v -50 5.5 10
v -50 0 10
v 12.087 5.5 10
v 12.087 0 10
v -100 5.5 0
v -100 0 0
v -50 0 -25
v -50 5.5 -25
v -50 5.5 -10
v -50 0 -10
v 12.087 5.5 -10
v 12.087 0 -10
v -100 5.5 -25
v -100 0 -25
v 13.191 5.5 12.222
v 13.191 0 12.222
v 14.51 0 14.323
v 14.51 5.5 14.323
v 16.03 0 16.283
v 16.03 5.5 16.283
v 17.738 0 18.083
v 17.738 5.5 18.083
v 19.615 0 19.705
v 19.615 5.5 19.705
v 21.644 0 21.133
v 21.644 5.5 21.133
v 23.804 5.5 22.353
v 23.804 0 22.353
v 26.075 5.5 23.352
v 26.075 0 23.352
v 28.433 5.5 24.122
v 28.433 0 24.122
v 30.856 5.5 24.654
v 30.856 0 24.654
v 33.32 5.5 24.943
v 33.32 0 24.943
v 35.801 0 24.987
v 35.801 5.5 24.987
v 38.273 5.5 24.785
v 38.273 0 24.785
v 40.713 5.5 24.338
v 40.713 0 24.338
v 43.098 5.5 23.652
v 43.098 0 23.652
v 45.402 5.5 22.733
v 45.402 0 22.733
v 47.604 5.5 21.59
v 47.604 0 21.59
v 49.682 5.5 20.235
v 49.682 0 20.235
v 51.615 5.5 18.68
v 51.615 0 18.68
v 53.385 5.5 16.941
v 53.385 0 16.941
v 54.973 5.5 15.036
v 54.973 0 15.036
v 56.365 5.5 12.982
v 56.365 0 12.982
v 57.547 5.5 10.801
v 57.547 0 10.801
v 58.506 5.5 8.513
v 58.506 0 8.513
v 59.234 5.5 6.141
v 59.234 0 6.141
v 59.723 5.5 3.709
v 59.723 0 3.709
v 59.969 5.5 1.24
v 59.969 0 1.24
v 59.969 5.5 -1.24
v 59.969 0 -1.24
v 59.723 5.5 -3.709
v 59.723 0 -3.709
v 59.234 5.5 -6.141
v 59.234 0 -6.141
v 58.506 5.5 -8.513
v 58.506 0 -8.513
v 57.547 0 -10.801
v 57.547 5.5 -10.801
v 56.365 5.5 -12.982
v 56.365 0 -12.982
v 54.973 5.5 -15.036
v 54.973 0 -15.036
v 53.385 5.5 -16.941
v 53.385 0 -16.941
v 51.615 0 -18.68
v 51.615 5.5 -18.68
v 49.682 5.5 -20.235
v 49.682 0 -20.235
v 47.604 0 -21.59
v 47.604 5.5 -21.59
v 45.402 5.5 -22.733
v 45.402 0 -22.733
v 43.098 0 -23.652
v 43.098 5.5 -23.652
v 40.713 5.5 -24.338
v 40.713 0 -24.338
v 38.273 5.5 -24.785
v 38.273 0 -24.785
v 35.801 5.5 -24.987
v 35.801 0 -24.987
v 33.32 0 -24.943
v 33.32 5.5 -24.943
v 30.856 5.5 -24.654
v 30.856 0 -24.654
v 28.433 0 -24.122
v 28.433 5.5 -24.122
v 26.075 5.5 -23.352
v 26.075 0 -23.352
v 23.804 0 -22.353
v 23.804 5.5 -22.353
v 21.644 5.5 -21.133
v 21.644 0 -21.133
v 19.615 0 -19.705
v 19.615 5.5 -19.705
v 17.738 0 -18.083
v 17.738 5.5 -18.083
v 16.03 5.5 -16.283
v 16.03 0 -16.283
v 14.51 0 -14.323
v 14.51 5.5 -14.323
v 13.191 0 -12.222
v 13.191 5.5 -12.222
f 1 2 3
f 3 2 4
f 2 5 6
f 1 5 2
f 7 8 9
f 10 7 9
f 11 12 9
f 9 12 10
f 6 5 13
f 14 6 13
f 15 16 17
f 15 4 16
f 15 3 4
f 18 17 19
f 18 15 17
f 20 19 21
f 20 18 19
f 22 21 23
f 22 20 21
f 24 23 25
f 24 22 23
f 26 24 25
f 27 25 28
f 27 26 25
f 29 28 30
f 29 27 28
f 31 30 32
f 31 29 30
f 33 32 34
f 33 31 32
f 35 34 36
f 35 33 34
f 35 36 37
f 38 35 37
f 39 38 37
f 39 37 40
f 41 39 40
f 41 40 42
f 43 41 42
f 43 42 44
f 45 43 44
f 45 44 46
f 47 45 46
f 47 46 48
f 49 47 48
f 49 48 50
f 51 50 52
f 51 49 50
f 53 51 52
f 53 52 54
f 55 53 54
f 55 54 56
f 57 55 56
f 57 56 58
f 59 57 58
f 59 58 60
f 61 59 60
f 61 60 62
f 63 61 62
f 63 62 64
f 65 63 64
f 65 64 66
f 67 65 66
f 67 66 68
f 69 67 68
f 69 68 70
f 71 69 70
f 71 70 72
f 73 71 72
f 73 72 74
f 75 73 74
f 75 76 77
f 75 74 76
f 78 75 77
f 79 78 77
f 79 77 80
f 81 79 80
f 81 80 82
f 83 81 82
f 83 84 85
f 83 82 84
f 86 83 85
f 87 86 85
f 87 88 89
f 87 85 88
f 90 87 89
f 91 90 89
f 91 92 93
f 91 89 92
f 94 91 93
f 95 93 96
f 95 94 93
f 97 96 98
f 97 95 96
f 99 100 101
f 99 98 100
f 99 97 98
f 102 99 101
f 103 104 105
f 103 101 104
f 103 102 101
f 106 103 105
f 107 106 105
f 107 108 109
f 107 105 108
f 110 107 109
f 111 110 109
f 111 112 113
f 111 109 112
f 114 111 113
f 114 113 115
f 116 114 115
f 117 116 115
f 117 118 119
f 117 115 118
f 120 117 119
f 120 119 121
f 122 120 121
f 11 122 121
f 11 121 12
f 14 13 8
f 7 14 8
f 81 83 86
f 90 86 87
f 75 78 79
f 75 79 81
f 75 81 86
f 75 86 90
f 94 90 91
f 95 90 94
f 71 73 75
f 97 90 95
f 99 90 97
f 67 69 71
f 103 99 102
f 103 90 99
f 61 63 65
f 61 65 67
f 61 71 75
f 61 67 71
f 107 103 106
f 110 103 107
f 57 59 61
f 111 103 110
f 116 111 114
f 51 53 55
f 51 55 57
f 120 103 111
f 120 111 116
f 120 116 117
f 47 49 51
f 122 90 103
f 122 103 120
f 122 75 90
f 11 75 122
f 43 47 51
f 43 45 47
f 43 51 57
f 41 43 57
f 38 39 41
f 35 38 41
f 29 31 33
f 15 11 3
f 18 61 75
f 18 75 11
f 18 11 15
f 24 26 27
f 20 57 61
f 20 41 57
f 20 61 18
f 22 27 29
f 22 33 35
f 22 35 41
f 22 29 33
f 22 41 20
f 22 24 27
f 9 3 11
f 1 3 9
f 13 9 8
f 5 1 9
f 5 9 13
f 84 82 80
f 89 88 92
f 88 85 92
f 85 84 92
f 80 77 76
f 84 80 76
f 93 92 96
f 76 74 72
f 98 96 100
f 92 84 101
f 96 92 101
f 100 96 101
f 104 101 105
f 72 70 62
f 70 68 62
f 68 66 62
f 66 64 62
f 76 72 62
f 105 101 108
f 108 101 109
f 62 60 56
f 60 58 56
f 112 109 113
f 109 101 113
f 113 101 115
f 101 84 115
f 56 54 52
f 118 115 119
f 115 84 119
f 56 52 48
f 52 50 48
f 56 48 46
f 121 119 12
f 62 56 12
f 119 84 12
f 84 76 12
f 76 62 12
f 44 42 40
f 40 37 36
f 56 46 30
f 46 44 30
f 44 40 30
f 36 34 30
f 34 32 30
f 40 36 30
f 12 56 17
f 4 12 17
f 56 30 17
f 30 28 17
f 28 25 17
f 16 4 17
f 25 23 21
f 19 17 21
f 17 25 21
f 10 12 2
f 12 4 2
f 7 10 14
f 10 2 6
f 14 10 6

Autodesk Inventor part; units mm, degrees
ref_plane "YZ Plane" through (0, 0, 0) normal (1, 0, 0) x (0, 1, 0)
ref_plane "XZ Plane" through (0, 0, 0) normal (0, 1, 0) x (-1, 0, 0)
ref_plane "XY Plane" through (0, 0, 0) normal (0, 0, 1) x (1, 0, 0)
sketch "Boceto1" plane through (0, 0, 0) normal (0, 1, 0) x (-1, 0, 0)
  line L0 (50, 10) -> (-50, 10)
  line L1 (-50, 10) -> (-50, -10)
  line L2 (-50, -10) -> (50, -10)
  line L3 (50, -10) -> (50, 10)
  line L4 (50, 10) -> (-50, -10) construction
  line L5 (-50, 10) -> (50, -10) construction
  line L6 (-50, -10) -> (-20, -10)
  line L7 (0, 0) -> (50, 0)
  line L8 (0, 0) -> (0, 10)
  dimension "d0" = 100
  dimension "d1" = 20
  dimension "d2" = 30
extrude "Extrusión1" add sketch "Boceto1" along normal blind 5.5 contours L3 L7 L8 L0
extrude "Extrusión2" add sketch "Boceto1" along normal blind 5.5 contours L8 L7 L3 L2 L1 L0
sketch "Boceto5" plane through (0, 5.5, 0) normal (0, 1, 0) x (1, 0, 0)
  line L0 (50, 10) -> (-50, 10) projected
  line L1 (20, 0) -> (50, 0)
  circle A0 centre (35, 0) radius 25
  line L2 (35, 25) -> (35, 20)
  line L3 (35, 20) -> (50, 20)
  line L4 (35, 20) -> (20, 20)
  line L5 (35, 0) -> (50, 0)
  point P0 (0, 0)
  point P1 (20, 10)
  dimension "d27" = 50
extrude "Extrusión8" add sketch "Boceto5" against normal blind 5.5
sketch "Boceto6" plane through (0, 5.5, 0) normal (0, 1, 0) x (1, 0, 0)
  line L0 (12.0871, 10) -> (-50, 10) projected
  line L1 (-50, 10) -> (-50, -10) projected
  line L2 (-50, -10) -> (12.0871, -10) projected
  arc A0 (12.0871, -10) -> (12.0871, 10) centre (35, 0) ccw projected
  line L3 (-50, 10) -> (-50, -10) projected
  line L4 (-50, 0) -> (-100, 0)
  line L5 (-100, 0) -> (-50, -10)
  line L6 (-100, 0) -> (-100, 50)
  line L7 (-100, 50) -> (-50, 50)
  line L8 (-50, 50) -> (-50, 0)
  line L9 (-100, 25) -> (-50, 25)
  point P0 (0, 0)
  dimension "d33" = 50
  dimension "d34" = 50
extrude "Extrusión9" add sketch "Boceto6" against normal blind 5.5 contours L1 L4 L6 L9 L8 | L1 L5 L4
properties part number "PINZA_I"
